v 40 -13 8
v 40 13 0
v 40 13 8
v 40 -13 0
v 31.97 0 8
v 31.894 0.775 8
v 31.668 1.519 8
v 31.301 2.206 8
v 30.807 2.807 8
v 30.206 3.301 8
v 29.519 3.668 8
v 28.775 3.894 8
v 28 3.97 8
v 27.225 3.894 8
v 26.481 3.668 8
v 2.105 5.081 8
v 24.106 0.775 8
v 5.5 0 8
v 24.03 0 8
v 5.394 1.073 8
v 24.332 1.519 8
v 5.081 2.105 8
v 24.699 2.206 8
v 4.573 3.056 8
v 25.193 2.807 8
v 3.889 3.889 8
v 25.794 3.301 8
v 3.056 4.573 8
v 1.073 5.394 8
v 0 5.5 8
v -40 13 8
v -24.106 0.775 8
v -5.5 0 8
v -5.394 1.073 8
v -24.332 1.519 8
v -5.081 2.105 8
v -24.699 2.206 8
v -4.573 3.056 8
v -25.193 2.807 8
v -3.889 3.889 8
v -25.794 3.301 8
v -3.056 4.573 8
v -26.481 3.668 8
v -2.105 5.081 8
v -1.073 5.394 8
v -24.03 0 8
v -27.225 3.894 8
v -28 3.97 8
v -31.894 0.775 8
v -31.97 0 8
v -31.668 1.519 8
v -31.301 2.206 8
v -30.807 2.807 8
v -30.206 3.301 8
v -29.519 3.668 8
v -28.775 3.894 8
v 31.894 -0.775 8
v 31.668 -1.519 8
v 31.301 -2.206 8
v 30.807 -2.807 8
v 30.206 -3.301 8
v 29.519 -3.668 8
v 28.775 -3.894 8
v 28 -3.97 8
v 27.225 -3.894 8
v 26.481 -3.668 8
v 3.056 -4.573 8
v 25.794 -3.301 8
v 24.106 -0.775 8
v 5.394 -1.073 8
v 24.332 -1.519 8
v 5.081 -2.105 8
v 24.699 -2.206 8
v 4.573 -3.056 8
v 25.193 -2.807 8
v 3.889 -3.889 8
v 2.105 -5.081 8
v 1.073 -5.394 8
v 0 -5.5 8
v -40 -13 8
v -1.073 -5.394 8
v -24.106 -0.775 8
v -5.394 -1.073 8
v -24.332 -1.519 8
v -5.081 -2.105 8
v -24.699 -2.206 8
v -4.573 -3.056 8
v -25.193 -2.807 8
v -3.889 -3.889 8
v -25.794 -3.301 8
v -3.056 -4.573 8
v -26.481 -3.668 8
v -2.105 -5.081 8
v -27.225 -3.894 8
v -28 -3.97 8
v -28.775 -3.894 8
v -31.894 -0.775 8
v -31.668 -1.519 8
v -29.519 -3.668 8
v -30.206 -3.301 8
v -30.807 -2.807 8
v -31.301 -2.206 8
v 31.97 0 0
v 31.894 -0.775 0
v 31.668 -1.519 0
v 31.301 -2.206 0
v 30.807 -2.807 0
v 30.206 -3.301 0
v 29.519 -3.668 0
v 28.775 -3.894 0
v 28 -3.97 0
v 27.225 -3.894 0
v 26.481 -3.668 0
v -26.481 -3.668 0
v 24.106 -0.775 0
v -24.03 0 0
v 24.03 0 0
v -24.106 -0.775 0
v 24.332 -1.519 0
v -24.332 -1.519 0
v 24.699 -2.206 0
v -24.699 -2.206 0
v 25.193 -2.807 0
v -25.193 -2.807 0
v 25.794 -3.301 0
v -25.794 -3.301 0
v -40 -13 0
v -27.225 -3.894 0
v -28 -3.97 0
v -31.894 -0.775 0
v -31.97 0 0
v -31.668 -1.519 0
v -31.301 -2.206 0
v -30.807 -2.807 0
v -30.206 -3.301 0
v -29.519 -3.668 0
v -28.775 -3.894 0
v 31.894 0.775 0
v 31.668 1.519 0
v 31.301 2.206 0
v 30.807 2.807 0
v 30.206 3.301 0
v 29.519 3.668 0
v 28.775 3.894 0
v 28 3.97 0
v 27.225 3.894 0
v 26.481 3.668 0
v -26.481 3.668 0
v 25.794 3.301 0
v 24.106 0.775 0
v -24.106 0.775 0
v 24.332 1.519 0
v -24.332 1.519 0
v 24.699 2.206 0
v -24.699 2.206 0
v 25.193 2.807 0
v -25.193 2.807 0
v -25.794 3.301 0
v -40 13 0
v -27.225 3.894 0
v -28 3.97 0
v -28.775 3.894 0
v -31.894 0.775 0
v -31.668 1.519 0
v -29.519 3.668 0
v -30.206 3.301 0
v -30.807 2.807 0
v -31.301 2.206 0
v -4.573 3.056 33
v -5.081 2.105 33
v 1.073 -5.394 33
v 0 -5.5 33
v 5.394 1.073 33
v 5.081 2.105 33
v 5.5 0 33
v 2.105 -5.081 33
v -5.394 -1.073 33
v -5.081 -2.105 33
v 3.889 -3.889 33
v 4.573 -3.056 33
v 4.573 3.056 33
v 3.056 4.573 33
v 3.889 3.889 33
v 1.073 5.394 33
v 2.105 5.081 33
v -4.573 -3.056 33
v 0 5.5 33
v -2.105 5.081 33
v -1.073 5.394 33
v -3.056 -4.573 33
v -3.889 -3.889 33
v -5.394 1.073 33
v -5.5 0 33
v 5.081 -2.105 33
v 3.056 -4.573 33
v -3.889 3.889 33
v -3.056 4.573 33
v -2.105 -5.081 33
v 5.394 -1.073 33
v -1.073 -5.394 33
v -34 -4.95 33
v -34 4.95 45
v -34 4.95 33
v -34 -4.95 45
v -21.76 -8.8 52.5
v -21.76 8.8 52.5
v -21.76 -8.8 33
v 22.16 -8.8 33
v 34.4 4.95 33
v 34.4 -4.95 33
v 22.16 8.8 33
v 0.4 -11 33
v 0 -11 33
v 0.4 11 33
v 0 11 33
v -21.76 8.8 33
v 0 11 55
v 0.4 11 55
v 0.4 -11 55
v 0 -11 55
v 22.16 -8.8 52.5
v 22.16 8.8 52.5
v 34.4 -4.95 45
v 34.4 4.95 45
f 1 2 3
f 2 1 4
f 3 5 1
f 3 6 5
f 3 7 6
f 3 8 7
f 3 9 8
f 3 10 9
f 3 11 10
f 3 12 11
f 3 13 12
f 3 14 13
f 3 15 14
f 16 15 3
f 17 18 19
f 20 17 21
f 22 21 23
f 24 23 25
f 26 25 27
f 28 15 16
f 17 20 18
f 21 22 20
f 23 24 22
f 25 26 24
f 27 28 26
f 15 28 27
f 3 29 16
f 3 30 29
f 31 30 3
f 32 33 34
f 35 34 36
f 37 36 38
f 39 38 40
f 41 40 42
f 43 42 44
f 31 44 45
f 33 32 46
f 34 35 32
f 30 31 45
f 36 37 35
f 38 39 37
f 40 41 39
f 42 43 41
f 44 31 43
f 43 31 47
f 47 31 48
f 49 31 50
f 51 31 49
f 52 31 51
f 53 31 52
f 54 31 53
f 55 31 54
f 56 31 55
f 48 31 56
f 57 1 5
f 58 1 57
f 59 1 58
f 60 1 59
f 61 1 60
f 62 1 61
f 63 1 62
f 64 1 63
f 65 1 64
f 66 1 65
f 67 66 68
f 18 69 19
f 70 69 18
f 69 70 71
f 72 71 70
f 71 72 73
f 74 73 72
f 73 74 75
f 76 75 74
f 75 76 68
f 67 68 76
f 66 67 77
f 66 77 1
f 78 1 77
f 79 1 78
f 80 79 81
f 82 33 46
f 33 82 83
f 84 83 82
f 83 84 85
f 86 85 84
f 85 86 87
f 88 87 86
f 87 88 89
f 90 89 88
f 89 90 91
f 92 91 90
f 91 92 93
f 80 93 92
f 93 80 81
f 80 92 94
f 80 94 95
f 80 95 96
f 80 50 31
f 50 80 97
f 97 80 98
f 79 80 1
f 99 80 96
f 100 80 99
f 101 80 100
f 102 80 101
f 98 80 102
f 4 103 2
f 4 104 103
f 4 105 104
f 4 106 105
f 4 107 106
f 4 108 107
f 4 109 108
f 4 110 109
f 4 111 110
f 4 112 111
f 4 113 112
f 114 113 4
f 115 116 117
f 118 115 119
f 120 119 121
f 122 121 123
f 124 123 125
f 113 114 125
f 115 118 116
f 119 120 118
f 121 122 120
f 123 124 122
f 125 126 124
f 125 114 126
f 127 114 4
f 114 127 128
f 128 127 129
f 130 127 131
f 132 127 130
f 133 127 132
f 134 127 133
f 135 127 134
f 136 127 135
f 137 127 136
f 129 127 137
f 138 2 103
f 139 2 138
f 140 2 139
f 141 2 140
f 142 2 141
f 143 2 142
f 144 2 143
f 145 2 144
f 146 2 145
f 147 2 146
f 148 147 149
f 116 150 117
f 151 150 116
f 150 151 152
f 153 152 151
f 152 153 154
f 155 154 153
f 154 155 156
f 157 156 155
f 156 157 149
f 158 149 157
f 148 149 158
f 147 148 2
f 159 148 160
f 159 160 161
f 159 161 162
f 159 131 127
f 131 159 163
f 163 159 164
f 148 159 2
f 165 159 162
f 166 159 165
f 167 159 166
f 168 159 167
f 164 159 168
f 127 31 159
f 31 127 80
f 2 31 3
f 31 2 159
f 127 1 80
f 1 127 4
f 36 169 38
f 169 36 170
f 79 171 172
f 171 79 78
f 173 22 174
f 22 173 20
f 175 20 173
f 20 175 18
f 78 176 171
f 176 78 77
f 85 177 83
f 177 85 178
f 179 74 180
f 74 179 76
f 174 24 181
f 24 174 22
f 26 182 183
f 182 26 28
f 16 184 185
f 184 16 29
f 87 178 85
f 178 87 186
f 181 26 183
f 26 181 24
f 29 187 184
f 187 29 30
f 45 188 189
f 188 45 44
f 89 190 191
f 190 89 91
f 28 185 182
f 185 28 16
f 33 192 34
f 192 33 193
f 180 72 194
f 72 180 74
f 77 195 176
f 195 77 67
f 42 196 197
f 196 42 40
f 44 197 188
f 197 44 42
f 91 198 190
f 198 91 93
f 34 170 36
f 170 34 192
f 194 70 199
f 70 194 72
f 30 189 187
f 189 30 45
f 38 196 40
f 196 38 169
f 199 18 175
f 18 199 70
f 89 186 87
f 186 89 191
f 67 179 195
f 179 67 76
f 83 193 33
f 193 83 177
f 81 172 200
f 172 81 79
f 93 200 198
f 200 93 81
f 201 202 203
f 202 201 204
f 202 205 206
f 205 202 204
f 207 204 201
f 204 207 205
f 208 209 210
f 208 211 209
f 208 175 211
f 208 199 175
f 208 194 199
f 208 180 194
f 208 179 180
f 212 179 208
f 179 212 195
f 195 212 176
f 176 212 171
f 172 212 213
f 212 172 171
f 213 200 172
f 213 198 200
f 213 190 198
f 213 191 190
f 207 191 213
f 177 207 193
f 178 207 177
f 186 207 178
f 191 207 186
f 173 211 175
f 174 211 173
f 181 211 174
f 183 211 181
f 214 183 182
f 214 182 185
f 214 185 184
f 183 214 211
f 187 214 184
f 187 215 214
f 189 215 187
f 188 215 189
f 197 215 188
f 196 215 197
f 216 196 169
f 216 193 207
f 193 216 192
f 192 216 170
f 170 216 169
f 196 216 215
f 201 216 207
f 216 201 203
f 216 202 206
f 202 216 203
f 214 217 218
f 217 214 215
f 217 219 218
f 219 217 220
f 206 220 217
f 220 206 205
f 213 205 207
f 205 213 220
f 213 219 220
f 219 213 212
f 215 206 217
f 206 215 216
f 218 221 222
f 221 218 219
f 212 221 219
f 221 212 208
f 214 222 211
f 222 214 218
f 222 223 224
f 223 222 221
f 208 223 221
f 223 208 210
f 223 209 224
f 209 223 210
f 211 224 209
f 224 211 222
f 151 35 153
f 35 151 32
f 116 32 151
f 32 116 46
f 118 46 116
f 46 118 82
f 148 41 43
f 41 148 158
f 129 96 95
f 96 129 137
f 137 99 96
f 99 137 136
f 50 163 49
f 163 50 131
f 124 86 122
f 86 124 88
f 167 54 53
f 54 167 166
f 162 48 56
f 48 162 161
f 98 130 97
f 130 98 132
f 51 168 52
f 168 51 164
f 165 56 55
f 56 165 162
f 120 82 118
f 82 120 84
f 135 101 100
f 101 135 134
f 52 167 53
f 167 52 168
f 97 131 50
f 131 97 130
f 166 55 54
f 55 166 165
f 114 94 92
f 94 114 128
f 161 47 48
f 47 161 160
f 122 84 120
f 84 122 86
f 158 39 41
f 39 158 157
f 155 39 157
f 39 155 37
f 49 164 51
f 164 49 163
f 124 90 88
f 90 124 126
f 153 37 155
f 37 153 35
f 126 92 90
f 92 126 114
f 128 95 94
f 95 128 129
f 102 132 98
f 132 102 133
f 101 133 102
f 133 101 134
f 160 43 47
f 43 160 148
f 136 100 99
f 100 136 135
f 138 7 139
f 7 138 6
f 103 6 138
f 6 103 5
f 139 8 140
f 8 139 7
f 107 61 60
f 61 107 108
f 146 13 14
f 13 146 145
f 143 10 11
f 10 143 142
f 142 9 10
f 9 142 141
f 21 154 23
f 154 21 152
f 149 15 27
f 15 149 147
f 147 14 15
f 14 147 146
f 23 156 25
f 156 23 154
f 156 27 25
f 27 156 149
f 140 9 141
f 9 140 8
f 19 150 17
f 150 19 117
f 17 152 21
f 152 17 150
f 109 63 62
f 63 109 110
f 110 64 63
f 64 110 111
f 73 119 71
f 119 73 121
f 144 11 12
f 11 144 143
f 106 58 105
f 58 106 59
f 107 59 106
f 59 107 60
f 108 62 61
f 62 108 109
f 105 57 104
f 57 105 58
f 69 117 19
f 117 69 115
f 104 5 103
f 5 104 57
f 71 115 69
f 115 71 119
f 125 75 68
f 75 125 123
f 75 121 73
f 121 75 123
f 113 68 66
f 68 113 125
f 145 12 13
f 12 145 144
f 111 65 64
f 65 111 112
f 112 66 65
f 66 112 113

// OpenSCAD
$fn = 32;

// ----------------------------------------------------------------------
// Boat cleat: 80 mm base, horn 44 mm up
// ----------------------------------------------------------------------

// --- parameters (mm) ---
base_l = 80;              // base length
base_w = 26;              // base width
base_t = 8;               // base thickness
horn_len = 68;            // horn length
horn_d = 22;              // horn diameter at the middle
horn_z = 44;              // horn axis height
end_drop = 10;            // how far the horn tips drop
post_d = 11;              // centre post diameter
holes_d = 7.94;           // fixing holes
hole_x = 28;              // fixing hole spacing

difference() {
  union() {
    translate([-40, -13, 0]) cube([base_l, base_w, base_t]);
    /* centre post, sunk 1 mm into the base */
    translate([0, 0, 7]) cylinder(h = 37, d = post_d);
    /* horn: a hull chain of boxes, full in the middle and lighter at the tips */
    hull() {
      translate([-34, -4.95, 33]) cube([0.4, 9.9, 12], center = false);
      translate([-21.76, -8.8, 33]) cube([0.4, 17.6, 19.5], center = false);
    }
    hull() {
      translate([-21.76, -8.8, 33]) cube([0.4, 17.6, 19.5], center = false);
      translate([0, -11, 33]) cube([0.4, 22, 22], center = false);
    }
    hull() {
      translate([0, -11, 33]) cube([0.4, 22, 22], center = false);
      translate([21.76, -8.8, 33]) cube([0.4, 17.6, 19.5], center = false);
    }
    hull() {
      translate([21.76, -8.8, 33]) cube([0.4, 17.6, 19.5], center = false);
      translate([34, -4.95, 33]) cube([0.4, 9.9, 12], center = false);
    }
  }
  translate([-28, 0, -2.5]) cylinder(h = base_t + 5, d = holes_d);
  translate([28, 0, -2.5]) cylinder(h = base_t + 5, d = holes_d);
}
